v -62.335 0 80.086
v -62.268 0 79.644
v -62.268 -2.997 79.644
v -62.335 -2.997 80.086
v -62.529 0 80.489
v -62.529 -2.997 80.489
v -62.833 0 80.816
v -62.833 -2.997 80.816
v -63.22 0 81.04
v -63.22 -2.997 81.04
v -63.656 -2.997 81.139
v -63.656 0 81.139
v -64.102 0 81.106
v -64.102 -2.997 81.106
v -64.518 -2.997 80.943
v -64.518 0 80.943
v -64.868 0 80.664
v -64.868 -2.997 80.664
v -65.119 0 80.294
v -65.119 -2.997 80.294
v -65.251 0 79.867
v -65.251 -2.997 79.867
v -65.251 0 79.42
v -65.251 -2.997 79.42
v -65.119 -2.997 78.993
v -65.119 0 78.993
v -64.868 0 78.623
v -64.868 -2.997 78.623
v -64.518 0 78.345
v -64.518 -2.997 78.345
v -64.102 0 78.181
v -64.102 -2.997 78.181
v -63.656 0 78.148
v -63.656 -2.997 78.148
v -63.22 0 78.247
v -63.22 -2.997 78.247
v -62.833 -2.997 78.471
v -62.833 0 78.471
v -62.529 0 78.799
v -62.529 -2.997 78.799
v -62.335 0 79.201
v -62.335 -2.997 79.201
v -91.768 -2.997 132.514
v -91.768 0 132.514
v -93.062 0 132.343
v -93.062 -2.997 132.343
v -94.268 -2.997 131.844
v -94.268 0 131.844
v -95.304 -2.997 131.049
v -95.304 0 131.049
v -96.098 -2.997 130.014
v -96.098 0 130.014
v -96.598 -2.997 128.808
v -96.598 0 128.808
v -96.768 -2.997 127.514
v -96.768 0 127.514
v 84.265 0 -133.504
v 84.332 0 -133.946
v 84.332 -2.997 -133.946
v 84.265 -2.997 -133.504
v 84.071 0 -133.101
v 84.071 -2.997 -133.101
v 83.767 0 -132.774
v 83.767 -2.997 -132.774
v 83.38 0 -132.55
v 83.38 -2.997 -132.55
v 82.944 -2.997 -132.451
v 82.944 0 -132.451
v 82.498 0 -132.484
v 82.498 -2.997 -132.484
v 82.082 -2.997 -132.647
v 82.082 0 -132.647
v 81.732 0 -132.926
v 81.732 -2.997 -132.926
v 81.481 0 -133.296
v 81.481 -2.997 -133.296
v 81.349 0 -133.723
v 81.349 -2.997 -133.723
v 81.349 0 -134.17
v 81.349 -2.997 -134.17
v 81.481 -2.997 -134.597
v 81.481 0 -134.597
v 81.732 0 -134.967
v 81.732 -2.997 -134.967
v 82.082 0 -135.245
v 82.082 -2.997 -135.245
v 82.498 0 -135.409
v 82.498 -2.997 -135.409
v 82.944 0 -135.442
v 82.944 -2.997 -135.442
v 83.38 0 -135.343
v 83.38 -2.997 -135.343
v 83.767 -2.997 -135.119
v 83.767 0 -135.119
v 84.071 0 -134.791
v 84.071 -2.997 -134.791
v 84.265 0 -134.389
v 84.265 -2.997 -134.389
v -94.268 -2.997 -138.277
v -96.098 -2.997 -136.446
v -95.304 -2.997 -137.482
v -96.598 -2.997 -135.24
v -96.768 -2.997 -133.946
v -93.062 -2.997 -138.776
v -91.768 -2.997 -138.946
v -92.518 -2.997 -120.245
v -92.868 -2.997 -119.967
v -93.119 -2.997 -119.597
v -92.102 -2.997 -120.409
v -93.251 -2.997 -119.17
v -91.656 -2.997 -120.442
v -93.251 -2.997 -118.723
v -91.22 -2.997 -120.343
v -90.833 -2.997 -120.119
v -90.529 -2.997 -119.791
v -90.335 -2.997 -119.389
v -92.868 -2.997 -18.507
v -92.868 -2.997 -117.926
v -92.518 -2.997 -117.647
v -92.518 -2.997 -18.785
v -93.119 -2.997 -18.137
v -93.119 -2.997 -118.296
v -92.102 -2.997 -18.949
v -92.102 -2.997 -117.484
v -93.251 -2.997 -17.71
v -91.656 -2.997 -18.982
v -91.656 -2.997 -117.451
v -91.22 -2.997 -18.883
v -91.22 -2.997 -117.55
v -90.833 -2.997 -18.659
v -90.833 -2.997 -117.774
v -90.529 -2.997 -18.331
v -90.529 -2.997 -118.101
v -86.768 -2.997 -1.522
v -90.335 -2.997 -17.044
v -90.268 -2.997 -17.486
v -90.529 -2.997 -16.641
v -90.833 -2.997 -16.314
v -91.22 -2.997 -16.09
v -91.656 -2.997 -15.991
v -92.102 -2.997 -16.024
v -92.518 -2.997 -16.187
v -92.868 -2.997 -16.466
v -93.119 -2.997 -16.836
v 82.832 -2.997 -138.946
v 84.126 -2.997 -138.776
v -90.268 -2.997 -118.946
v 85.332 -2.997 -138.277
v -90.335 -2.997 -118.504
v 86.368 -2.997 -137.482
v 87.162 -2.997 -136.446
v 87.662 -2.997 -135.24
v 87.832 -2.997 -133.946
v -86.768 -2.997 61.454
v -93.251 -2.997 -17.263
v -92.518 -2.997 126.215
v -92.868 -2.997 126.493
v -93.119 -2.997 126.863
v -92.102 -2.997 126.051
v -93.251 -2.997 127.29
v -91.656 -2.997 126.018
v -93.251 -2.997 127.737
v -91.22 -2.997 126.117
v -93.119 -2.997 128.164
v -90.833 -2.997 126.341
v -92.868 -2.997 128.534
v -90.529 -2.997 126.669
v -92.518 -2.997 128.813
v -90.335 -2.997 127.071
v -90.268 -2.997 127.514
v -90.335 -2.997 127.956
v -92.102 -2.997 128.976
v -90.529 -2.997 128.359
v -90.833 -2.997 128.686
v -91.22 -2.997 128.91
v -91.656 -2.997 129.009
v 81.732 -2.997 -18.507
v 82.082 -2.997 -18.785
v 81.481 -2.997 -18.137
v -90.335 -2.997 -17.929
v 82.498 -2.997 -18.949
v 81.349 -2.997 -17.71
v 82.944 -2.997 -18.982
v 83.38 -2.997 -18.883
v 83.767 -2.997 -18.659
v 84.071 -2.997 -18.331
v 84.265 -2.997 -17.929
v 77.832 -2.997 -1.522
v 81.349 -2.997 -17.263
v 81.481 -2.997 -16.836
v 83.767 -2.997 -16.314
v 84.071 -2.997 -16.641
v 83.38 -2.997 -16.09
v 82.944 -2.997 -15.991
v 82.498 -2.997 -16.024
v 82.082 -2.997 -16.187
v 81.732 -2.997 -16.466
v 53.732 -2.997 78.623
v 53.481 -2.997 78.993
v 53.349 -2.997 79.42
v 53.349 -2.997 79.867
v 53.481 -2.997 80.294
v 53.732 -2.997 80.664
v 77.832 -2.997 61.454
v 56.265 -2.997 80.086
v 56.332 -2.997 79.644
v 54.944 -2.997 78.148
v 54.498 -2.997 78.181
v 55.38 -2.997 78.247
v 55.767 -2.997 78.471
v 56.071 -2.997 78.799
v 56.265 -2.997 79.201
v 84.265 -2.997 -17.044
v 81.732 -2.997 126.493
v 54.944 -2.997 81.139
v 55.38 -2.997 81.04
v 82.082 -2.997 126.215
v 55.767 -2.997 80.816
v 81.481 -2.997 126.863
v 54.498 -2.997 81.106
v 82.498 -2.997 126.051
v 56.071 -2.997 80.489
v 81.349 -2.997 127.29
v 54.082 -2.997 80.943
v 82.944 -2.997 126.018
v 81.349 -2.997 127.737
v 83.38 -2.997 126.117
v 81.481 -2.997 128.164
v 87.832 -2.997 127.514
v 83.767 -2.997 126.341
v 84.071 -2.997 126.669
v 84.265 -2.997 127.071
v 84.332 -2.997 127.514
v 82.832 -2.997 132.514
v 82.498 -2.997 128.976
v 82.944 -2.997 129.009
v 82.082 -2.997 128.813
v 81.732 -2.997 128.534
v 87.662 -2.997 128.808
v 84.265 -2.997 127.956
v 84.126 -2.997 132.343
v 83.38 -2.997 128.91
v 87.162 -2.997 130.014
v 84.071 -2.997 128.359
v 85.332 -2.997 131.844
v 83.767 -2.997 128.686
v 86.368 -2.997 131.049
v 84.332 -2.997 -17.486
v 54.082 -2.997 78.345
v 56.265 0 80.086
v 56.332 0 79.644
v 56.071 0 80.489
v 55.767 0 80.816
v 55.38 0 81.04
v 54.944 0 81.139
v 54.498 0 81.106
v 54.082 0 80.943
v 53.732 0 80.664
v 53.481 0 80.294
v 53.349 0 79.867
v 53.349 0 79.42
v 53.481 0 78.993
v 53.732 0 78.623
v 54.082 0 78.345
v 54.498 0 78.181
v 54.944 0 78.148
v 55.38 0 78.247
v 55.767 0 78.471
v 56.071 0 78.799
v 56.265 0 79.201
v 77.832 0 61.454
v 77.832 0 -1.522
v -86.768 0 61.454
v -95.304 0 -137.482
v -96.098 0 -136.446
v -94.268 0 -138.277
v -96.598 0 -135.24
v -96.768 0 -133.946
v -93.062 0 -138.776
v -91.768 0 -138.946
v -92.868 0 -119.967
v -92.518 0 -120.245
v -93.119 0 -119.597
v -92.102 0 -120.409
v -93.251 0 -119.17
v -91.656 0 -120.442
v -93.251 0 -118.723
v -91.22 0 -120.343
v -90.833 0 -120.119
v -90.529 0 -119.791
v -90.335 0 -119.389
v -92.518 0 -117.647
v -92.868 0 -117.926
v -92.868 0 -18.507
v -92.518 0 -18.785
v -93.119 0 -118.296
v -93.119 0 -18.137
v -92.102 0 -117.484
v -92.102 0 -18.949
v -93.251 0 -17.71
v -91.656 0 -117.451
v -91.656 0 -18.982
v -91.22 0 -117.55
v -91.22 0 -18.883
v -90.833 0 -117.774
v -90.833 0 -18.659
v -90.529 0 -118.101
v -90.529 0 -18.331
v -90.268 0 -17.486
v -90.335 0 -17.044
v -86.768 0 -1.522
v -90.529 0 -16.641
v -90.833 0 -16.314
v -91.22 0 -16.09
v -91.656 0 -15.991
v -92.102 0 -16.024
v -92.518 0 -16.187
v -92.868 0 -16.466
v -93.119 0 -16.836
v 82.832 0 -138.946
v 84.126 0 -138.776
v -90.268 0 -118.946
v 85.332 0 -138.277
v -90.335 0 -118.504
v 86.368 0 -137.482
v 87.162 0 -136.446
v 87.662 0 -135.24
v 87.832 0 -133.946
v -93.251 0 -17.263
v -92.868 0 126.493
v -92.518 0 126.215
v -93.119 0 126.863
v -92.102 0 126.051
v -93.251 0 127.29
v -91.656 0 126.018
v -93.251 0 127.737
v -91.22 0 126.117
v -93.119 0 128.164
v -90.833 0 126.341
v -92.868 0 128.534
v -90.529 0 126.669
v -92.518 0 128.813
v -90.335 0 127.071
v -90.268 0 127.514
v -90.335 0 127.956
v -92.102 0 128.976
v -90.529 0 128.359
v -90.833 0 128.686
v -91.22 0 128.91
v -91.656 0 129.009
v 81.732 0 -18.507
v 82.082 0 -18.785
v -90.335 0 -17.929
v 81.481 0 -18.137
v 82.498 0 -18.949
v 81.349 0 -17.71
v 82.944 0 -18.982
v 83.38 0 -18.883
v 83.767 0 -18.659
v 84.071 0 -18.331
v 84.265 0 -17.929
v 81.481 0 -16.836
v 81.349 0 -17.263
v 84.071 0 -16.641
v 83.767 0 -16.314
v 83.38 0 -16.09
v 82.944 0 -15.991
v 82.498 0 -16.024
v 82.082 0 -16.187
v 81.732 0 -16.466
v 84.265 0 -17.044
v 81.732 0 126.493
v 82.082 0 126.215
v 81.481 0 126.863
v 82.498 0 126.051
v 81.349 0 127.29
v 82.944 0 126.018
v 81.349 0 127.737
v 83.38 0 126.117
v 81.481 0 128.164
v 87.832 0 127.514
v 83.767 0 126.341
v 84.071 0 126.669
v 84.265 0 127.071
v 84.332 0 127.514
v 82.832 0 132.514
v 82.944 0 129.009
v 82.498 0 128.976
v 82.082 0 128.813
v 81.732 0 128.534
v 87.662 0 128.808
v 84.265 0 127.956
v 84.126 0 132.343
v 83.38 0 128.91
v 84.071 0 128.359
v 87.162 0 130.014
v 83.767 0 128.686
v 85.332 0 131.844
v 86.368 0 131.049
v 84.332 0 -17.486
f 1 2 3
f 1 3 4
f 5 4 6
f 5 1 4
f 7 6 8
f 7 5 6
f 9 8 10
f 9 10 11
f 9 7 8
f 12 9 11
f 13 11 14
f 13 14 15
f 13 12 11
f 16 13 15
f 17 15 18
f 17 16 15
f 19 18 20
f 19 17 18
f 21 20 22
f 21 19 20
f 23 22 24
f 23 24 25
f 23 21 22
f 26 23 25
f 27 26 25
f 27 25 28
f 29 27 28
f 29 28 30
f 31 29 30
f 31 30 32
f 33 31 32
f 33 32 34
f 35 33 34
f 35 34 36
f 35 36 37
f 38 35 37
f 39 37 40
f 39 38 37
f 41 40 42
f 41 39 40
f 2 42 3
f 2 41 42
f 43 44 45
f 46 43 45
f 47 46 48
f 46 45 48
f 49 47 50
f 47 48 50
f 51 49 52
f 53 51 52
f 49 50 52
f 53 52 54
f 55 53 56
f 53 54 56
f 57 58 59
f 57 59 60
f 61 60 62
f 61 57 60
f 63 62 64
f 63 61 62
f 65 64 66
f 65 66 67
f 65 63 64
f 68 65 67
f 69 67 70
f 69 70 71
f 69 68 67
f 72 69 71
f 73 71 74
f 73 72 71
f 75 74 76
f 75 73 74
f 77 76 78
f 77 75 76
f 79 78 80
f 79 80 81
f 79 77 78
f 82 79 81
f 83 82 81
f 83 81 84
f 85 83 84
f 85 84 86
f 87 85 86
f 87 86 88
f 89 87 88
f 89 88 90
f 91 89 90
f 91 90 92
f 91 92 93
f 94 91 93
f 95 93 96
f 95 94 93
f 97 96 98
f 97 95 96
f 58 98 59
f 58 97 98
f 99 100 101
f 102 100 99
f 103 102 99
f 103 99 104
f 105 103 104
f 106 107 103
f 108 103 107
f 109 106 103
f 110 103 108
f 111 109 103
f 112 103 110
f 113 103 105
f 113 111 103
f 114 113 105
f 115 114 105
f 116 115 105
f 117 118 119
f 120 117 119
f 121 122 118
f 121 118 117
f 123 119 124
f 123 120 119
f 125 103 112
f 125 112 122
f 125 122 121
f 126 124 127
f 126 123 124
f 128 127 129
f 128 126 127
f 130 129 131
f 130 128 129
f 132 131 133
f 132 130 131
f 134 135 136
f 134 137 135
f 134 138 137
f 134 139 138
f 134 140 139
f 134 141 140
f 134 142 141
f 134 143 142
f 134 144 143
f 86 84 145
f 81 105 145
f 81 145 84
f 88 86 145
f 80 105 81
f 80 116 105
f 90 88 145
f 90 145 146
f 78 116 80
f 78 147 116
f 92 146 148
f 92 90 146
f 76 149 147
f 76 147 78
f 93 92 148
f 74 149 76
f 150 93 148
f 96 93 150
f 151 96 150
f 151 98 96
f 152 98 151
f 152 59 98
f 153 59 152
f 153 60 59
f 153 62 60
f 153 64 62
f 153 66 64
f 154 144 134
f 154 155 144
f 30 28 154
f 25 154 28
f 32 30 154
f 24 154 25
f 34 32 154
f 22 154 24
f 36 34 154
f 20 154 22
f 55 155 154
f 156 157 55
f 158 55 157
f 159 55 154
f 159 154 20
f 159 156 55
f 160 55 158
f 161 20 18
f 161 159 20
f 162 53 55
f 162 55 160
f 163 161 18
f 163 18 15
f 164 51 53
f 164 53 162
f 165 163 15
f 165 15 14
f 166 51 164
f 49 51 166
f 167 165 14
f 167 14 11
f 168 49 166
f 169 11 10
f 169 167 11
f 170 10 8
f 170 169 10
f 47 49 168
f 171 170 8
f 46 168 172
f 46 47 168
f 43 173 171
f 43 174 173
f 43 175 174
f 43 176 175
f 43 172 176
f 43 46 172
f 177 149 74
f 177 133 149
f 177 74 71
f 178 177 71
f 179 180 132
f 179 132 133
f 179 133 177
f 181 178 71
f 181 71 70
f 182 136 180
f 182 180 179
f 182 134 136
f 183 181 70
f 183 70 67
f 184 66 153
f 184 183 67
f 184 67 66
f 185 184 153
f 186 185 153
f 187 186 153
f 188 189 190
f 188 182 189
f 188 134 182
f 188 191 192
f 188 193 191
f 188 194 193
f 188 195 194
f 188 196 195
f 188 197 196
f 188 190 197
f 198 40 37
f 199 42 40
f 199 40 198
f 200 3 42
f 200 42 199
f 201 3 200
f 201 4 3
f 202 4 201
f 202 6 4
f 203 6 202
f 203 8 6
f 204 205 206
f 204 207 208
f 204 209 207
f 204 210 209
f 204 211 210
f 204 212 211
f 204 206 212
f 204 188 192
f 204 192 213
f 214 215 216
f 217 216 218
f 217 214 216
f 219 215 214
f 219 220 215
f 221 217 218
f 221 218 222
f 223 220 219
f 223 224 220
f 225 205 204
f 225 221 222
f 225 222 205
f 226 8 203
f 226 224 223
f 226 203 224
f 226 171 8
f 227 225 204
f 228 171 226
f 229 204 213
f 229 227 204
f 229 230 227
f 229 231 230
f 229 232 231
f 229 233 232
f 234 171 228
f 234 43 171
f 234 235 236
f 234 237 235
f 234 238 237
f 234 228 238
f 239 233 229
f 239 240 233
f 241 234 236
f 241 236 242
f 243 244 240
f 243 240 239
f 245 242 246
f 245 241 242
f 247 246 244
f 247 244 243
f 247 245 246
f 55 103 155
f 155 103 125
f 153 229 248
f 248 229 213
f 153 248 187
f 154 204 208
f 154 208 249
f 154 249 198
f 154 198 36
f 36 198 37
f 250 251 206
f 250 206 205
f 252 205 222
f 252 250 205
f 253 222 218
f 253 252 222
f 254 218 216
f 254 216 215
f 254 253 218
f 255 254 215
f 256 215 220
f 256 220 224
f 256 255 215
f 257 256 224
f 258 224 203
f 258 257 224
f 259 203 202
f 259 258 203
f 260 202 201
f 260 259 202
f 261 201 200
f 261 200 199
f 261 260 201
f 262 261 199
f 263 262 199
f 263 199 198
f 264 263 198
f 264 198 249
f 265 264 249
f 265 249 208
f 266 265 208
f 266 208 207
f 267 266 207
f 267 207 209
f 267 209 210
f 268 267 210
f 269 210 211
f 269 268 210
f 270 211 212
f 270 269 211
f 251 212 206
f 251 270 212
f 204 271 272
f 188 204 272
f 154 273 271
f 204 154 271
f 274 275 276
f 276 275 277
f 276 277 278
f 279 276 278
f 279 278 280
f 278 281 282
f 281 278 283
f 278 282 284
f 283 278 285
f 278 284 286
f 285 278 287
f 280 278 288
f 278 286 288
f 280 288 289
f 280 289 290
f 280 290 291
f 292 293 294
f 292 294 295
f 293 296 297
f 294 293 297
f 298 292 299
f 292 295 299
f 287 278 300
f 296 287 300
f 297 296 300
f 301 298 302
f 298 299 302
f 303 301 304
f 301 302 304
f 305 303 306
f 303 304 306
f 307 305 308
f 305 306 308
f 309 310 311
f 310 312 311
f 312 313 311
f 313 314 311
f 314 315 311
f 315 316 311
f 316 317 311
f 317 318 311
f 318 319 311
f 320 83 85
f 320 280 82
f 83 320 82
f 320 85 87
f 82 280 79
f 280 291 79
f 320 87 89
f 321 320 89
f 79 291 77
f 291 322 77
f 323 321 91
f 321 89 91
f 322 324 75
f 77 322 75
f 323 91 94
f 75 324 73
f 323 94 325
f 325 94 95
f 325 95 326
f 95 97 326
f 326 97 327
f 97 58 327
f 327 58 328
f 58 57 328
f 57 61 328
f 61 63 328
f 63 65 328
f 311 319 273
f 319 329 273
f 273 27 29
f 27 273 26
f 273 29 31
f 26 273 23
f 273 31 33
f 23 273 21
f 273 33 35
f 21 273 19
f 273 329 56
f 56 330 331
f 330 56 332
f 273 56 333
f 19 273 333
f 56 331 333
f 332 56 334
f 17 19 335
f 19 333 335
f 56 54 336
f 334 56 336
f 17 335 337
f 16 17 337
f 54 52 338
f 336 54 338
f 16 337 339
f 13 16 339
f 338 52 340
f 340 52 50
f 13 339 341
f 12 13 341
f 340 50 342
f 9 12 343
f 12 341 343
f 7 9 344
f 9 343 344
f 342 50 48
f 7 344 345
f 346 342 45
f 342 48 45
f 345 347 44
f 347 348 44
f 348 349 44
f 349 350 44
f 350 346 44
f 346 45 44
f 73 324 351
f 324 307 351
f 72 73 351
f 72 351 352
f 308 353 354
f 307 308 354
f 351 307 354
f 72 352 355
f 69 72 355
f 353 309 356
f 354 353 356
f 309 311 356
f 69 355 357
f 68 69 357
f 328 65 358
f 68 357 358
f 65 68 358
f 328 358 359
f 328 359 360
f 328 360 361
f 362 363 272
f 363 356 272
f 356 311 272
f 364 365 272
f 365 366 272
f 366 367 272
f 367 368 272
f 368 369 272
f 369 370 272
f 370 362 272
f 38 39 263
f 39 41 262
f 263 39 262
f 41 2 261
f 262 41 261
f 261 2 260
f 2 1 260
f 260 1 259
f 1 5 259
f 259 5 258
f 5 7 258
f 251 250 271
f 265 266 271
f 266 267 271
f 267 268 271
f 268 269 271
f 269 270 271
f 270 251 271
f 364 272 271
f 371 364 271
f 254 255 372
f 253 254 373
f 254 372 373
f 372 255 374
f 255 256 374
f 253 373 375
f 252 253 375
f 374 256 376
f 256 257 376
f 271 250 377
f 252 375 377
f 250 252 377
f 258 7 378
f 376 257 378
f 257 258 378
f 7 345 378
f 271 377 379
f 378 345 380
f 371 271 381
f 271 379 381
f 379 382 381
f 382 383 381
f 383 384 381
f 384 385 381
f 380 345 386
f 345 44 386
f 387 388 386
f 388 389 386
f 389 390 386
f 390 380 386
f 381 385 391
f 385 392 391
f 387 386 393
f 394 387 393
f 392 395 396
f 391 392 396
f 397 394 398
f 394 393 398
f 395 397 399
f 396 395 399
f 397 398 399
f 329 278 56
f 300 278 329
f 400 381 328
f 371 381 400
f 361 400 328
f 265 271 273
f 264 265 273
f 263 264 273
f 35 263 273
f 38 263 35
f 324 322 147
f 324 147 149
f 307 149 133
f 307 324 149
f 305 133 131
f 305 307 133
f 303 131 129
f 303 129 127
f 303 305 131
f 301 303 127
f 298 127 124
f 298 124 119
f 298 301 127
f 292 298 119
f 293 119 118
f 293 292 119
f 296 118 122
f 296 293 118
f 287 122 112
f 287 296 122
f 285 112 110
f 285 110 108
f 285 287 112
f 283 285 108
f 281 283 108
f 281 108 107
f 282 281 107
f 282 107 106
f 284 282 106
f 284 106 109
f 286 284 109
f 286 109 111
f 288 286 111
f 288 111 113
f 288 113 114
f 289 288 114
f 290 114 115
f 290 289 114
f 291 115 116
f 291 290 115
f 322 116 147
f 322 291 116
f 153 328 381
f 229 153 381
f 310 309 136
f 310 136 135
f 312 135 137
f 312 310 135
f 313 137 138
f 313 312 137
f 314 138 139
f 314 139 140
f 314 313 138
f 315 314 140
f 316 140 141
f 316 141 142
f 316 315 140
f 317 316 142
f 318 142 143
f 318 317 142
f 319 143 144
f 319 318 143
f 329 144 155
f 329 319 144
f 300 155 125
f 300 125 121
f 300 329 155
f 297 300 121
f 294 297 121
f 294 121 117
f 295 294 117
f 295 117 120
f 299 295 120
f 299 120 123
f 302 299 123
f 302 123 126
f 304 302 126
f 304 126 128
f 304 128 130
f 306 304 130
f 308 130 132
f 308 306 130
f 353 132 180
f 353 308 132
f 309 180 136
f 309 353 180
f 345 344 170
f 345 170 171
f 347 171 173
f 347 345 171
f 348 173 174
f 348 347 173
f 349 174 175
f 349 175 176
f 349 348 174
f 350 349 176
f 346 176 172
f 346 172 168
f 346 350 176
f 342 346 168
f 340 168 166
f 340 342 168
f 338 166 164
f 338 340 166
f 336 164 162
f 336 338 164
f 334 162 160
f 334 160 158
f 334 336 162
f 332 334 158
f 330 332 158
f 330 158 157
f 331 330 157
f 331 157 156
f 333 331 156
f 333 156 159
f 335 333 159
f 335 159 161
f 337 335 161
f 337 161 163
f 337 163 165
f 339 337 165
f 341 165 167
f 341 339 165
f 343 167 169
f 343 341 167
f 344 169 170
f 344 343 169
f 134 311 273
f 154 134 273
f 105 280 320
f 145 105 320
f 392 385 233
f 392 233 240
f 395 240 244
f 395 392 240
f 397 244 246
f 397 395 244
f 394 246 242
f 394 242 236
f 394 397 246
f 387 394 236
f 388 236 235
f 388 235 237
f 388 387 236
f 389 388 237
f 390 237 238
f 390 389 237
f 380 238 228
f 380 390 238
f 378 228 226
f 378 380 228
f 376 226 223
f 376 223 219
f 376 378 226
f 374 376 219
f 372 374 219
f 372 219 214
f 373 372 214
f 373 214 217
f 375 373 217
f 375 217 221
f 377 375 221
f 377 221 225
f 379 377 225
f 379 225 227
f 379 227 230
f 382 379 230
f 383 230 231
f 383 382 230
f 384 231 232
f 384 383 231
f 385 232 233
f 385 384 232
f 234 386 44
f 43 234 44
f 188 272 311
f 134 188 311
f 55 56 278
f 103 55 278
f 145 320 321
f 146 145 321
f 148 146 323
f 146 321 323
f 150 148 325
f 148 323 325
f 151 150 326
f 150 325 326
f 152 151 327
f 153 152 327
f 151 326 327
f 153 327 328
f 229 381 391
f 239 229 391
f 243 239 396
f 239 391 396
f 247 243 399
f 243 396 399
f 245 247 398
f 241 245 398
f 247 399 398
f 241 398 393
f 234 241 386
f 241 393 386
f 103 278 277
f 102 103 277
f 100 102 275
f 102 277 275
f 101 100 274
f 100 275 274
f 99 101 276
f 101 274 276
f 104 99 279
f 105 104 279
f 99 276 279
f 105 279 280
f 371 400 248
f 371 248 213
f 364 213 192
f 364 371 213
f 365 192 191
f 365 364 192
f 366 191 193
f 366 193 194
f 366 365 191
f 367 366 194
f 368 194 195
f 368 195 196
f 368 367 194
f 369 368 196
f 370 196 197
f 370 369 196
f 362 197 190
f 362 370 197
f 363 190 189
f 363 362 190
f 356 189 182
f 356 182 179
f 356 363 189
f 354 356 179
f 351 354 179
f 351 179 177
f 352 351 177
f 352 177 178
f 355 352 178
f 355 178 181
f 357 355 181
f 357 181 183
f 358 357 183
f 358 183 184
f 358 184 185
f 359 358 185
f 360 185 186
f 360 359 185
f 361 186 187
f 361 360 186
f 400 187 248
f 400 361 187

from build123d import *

# Parameters (mm, degrees)
F0_R     = 1.5
F0_W     = 40
F0_H     = 6.7
F0_H_2   = 1.6
F0_W_2   = 10
F0_H_3   = 91.46
F0_W_3   = 15
F0_H_4   = 1.7
F0_H_5   = 15
F0_H_6   = 5
F0_H_7   = 52.41
F0_H_8   = 3.65
F0_H_9   = 1.48
F0_W_4   = 3
F0_H_10  = 0.6
F0_H_11  = 1.4
F1_DEPTH = 2.9972


# Not quite as in the source:
# - a feature names something its author has since deleted; it is built from what else it names


with BuildPart() as f1:
    # F0 (on Front) → F1 (new body)
    with BuildSketch(Plane.XZ):
        with BuildLine():
            Line((-24.4680281997, 132.5136111658), (-91.7680281997, 132.5136111658))
            ThreePointArc((-91.7680281997, 132.5136111658), (-95.3035621056, 131.0491450717), (-96.7680281997, 127.5136111658))
            Line((-96.7680281997, 127.5136111658), (-96.7680281997, -22.4863888342))
            Line((-96.7680281997, -22.4863888342), (-86.7680281997, -22.4863888342))
            Line((-86.7680281997, -22.4863888342), (-86.7680281997, -1.5222273069))
            Line((-86.7680281997, -1.5222273069), (-86.7680281997, 0))
            Line((-86.7680281997, 0), (-86.7680281997, 16.1536111658))
            Line((-86.7680281997, 16.1536111658), (-86.7680281997, 20.4536111658))
            Line((-86.7680281997, 20.4536111658), (-86.7680281997, 21.4536111658))
            Line((-86.7680281997, 21.4536111658), (-89.7680281997, 21.4536111658))
            Line((-89.7680281997, 21.4536111658), (-89.7680281997, 22.0536111658))
            Line((-89.7680281997, 22.0536111658), (-89.7680281997, 22.8536111658))
            Line((-89.7680281997, 22.8536111658), (-89.7680281997, 23.4536111658))
            Line((-89.7680281997, 23.4536111658), (-86.7680281997, 23.4536111658))
            Line((-86.7680281997, 23.4536111658), (-86.7680281997, 24.4536111658))
            Line((-86.7680281997, 24.4536111658), (-86.7680281997, 24.6436111658))
            Line((-86.7680281997, 24.6436111658), (-86.7680281997, 53.4536111658))
            Line((-86.7680281997, 53.4536111658), (-86.7680281997, 56.4536111658))
            Line((-86.7680281997, 56.4536111658), (-86.7680281997, 60.7536111658))
            Line((-86.7680281997, 60.7536111658), (-86.7680281997, 61.4536111658))
            Line((-86.7680281997, 61.4536111658), (-86.7680281997, 122.5136111658))
            Line((-86.7680281997, 122.5136111658), (-40.4680281997, 122.5136111658))
            Line((-40.4680281997, 122.5136111658), (-39.4680281997, 122.5136111658))
            Line((-39.4680281997, 122.5136111658), (-39.4680281997, 124.2136111658))
            Line((-39.4680281997, 124.2136111658), (-49.4680281997, 124.2136111658))
            Line((-49.4680281997, 124.2136111658), (-49.4680281997, 125.8136111658))
            Line((-49.4680281997, 125.8136111658), (-28.7680281997, 125.8136111658))
            Line((-28.7680281997, 125.8136111658), (-24.4680281997, 125.8136111658))
            Line((-24.4680281997, 125.8136111658), (-24.4680281997, 132.5136111658))
        make_face()
        with Locations((-91.7680281997, -17.4863888342)):
            Circle(F0_R, mode=Mode.SUBTRACT)
        with Locations((-91.7680281997, 127.5136111658)):
            Circle(F0_R, mode=Mode.SUBTRACT)
        with Locations((-4.4680281997, 129.1636111658)):
            Rectangle(F0_W, F0_H)
        with BuildLine():
            Line((82.8319718003, 132.5136111658), (15.5319718003, 132.5136111658))
            Line((15.5319718003, 132.5136111658), (15.5319718003, 125.8136111658))
            Line((15.5319718003, 125.8136111658), (21.2319718003, 125.8136111658))
            Line((21.2319718003, 125.8136111658), (40.5319718003, 125.8136111658))
            Line((40.5319718003, 125.8136111658), (40.5319718003, 124.2136111658))
            Line((40.5319718003, 124.2136111658), (30.5319718003, 124.2136111658))
            Line((30.5319718003, 124.2136111658), (30.5319718003, 122.5136111658))
            Line((30.5319718003, 122.5136111658), (40.5319718003, 122.5136111658))
            Line((40.5319718003, 122.5136111658), (77.8319718003, 122.5136111658))
            Line((77.8319718003, 122.5136111658), (77.8319718003, 61.4536111658))
            Line((77.8319718003, 61.4536111658), (77.8319718003, 60.7536111658))
            Line((77.8319718003, 60.7536111658), (77.8319718003, 56.4536111658))
            Line((77.8319718003, 56.4536111658), (77.8319718003, 53.4536111658))
            Line((77.8319718003, 53.4536111658), (77.8319718003, 24.6436111658))
            Line((77.8319718003, 24.6436111658), (77.8319718003, 24.4536111658))
            Line((77.8319718003, 24.4536111658), (77.8319718003, 23.4536111658))
            Line((77.8319718003, 23.4536111658), (80.8319718003, 23.4536111658))
            Line((80.8319718003, 23.4536111658), (80.8319718003, 22.8536111658))
            Line((80.8319718003, 22.8536111658), (80.8319718003, 21.4536111658))
            Line((80.8319718003, 21.4536111658), (77.8319718003, 21.4536111658))
            Line((77.8319718003, 21.4536111658), (77.8319718003, 20.4536111658))
            Line((77.8319718003, 20.4536111658), (77.8319718003, 16.1536111658))
            Line((77.8319718003, 16.1536111658), (77.8319718003, 4.5))
            Line((77.8319718003, 4.5), (77.8319718003, -1.5222273069))
            Line((77.8319718003, -1.5222273069), (77.8319718003, -128.9463888342))
            Line((77.8319718003, -128.9463888342), (1.2319718003, -128.9463888342))
            Line((1.2319718003, -128.9463888342), (1.2319718003, -130.4263888342))
            Line((1.2319718003, -130.4263888342), (3.7319718003, -130.4263888342))
            Line((3.7319718003, -130.4263888342), (3.7319718003, -132.0263888342))
            Line((3.7319718003, -132.0263888342), (-11.2680281997, -132.0263888342))
            Line((-11.2680281997, -132.0263888342), (-11.2680281997, -130.4263888342))
            Line((-11.2680281997, -130.4263888342), (-8.7680281997, -130.4263888342))
            Line((-8.7680281997, -130.4263888342), (-8.7680281997, -128.9463888342))
            Line((-8.7680281997, -128.9463888342), (-86.7680281997, -128.9463888342))
            Line((-86.7680281997, -128.9463888342), (-96.7680281997, -128.9463888342))
            Line((-96.7680281997, -128.9463888342), (-96.7680281997, -132.2803888342))
            Line((-96.7680281997, -132.2803888342), (-96.7680281997, -133.9463888342))
            ThreePointArc((-96.7680281997, -133.9463888342), (-95.3035621056, -137.4819227401), (-91.7680281997, -138.9463888342))
            Line((-91.7680281997, -138.9463888342), (82.8319718003, -138.9463888342))
            ThreePointArc((82.8319718003, -138.9463888342), (86.3675057063, -137.4819227401), (87.8319718003, -133.9463888342))
            Line((87.8319718003, -133.9463888342), (87.8319718003, 127.5136111658))
            ThreePointArc((87.8319718003, 127.5136111658), (86.3675057063, 131.0491450717), (82.8319718003, 132.5136111658))
        make_face()
        with Locations((82.8319718003, -133.9463888342)):
            Circle(F0_R, mode=Mode.SUBTRACT)
        with Locations((82.8319718003, -17.4863888342)):
            Circle(F0_R, mode=Mode.SUBTRACT)
        with Locations((82.8319718003, 127.5136111658)):
            Circle(F0_R, mode=Mode.SUBTRACT)
        Polygon((-24.4680281997, 124.2136111658), (-24.4680281997, 125.8136111658), (-28.7680281997, 125.8136111658), (-49.4680281997, 125.8136111658), (-49.4680281997, 124.2136111658), (-39.4680281997, 124.2136111658), align=None)
        with Locations((-4.4680281997, 125.0136111658)):
            Rectangle(F0_W, F0_H_2)
        with Locations((-91.7680281997, -68.2163888342)):
            Rectangle(F0_W_2, F0_H_3)
        Polygon((21.2319718003, 125.8136111658), (15.5319718003, 125.8136111658), (15.5319718003, 124.2136111658), (30.5319718003, 124.2136111658), (40.5319718003, 124.2136111658), (40.5319718003, 125.8136111658), align=None)
        with Locations((-31.9680281997, 123.3636111658)):
            Rectangle(F0_W_3, F0_H_4)
        with Locations((-4.4680281997, 123.3636111658)):
            Rectangle(F0_W, F0_H_4)
        with Locations((-91.7680281997, -121.4463888342)):
            Rectangle(F0_W_2, F0_H_5)
        with Locations((-91.7680281997, -118.9463888342)):
            Circle(F0_R, mode=Mode.SUBTRACT)
        Polygon((-86.7680281997, -1.5222273069), (-86.7680281997, -22.4863888342), (-86.7680281997, -113.9463888342), (-86.7680281997, -128.9463888342), (-8.7680281997, -128.9463888342), (1.2319718003, -128.9463888342), (77.8319718003, -128.9463888342), (77.8319718003, -1.5222273069), align=None)
        with Locations((23.0319718003, 123.3636111658)):
            Rectangle(F0_W_3, F0_H_4)
        with Locations((-31.9680281997, 120.0136111658)):
            Rectangle(F0_W_3, F0_H_6)
        with Locations((-4.4680281997, 120.0136111658)):
            Rectangle(F0_W, F0_H_6)
        with Locations((23.0319718003, 120.0136111658)):
            Rectangle(F0_W_3, F0_H_6)
        Polygon((-39.4680281997, 117.5136111658), (-39.4680281997, 122.5136111658), (-40.4680281997, 122.5136111658), (-86.7680281997, 122.5136111658), (-86.7680281997, 61.4536111658), (-79.4680281997, 61.4536111658), (-79.4680281997, 65.1036111658), (-66.1611799171, 65.1036111658), align=None)
        with Locations((-63.7680281997, 79.6436111658)):
            Circle(F0_R, mode=Mode.SUBTRACT)
        Polygon((-24.4680281997, 65.1036111658), (-24.4680281997, 117.5136111658), (-39.4680281997, 117.5136111658), (-66.1611799171, 65.1036111658), align=None)
        with Locations((-4.4680281997, 91.3086111658)):
            Rectangle(F0_W, F0_H_7)
        Polygon((40.5319718003, 122.5136111658), (30.5319718003, 122.5136111658), (30.5319718003, 117.5136111658), (57.2251235178, 65.1036111658), (70.5319718003, 65.1036111658), (70.5319718003, 61.4536111658), (77.8319718003, 61.4536111658), (77.8319718003, 122.5136111658), align=None)
        with Locations((54.8319718003, 79.6436111658)):
            Circle(F0_R, mode=Mode.SUBTRACT)
        Polygon((30.5319718003, 117.5136111658), (15.5319718003, 117.5136111658), (15.5319718003, 65.1036111658), (57.2251235178, 65.1036111658), align=None)
        with Locations((-4.4680281997, 63.2786111658)):
            Rectangle(F0_W, F0_H_8)
        Polygon((-24.4680281997, 61.4536111658), (-24.4680281997, 65.1036111658), (-66.1611799171, 65.1036111658), (-68.0201763638, 61.4536111658), align=None)
        with Locations((-3.7680281997, -129.6863888342)):
            Rectangle(F0_W_2, F0_H_9)
        Polygon((57.2251235178, 65.1036111658), (15.5319718003, 65.1036111658), (15.5319718003, 61.4536111658), (59.0841199644, 61.4536111658), align=None)
        Polygon((-68.0201763638, 61.4536111658), (-66.1611799171, 65.1036111658), (-79.4680281997, 65.1036111658), (-79.4680281997, 61.4536111658), align=None)
        Polygon((1.2319718003, -130.4263888342), (-8.7680281997, -130.4263888342), (-11.2680281997, -130.4263888342), (-11.2680281997, -132.0263888342), (3.7319718003, -132.0263888342), (3.7319718003, -130.4263888342), align=None)
        Polygon((70.5319718003, 65.1036111658), (57.2251235178, 65.1036111658), (59.0841199644, 61.4536111658), (70.5319718003, 61.4536111658), align=None)
        Polygon((-89.7680281997, 21.4536111658), (-86.7680281997, 21.4536111658), (-86.7680281997, 22.8536111658), (-89.7680281997, 22.8536111658), (-89.7680281997, 22.0536111658), align=None)
        with Locations((-88.2680281997, 23.1536111658)):
            Rectangle(F0_W_4, F0_H_10)
        with Locations((79.3319718003, 22.1536111658)):
            Rectangle(F0_W_4, F0_H_11)
        with Locations((79.3319718003, 23.1536111658)):
            Rectangle(F0_W_4, F0_H_10)
    extrude(amount=F1_DEPTH)


solid = f1.part
